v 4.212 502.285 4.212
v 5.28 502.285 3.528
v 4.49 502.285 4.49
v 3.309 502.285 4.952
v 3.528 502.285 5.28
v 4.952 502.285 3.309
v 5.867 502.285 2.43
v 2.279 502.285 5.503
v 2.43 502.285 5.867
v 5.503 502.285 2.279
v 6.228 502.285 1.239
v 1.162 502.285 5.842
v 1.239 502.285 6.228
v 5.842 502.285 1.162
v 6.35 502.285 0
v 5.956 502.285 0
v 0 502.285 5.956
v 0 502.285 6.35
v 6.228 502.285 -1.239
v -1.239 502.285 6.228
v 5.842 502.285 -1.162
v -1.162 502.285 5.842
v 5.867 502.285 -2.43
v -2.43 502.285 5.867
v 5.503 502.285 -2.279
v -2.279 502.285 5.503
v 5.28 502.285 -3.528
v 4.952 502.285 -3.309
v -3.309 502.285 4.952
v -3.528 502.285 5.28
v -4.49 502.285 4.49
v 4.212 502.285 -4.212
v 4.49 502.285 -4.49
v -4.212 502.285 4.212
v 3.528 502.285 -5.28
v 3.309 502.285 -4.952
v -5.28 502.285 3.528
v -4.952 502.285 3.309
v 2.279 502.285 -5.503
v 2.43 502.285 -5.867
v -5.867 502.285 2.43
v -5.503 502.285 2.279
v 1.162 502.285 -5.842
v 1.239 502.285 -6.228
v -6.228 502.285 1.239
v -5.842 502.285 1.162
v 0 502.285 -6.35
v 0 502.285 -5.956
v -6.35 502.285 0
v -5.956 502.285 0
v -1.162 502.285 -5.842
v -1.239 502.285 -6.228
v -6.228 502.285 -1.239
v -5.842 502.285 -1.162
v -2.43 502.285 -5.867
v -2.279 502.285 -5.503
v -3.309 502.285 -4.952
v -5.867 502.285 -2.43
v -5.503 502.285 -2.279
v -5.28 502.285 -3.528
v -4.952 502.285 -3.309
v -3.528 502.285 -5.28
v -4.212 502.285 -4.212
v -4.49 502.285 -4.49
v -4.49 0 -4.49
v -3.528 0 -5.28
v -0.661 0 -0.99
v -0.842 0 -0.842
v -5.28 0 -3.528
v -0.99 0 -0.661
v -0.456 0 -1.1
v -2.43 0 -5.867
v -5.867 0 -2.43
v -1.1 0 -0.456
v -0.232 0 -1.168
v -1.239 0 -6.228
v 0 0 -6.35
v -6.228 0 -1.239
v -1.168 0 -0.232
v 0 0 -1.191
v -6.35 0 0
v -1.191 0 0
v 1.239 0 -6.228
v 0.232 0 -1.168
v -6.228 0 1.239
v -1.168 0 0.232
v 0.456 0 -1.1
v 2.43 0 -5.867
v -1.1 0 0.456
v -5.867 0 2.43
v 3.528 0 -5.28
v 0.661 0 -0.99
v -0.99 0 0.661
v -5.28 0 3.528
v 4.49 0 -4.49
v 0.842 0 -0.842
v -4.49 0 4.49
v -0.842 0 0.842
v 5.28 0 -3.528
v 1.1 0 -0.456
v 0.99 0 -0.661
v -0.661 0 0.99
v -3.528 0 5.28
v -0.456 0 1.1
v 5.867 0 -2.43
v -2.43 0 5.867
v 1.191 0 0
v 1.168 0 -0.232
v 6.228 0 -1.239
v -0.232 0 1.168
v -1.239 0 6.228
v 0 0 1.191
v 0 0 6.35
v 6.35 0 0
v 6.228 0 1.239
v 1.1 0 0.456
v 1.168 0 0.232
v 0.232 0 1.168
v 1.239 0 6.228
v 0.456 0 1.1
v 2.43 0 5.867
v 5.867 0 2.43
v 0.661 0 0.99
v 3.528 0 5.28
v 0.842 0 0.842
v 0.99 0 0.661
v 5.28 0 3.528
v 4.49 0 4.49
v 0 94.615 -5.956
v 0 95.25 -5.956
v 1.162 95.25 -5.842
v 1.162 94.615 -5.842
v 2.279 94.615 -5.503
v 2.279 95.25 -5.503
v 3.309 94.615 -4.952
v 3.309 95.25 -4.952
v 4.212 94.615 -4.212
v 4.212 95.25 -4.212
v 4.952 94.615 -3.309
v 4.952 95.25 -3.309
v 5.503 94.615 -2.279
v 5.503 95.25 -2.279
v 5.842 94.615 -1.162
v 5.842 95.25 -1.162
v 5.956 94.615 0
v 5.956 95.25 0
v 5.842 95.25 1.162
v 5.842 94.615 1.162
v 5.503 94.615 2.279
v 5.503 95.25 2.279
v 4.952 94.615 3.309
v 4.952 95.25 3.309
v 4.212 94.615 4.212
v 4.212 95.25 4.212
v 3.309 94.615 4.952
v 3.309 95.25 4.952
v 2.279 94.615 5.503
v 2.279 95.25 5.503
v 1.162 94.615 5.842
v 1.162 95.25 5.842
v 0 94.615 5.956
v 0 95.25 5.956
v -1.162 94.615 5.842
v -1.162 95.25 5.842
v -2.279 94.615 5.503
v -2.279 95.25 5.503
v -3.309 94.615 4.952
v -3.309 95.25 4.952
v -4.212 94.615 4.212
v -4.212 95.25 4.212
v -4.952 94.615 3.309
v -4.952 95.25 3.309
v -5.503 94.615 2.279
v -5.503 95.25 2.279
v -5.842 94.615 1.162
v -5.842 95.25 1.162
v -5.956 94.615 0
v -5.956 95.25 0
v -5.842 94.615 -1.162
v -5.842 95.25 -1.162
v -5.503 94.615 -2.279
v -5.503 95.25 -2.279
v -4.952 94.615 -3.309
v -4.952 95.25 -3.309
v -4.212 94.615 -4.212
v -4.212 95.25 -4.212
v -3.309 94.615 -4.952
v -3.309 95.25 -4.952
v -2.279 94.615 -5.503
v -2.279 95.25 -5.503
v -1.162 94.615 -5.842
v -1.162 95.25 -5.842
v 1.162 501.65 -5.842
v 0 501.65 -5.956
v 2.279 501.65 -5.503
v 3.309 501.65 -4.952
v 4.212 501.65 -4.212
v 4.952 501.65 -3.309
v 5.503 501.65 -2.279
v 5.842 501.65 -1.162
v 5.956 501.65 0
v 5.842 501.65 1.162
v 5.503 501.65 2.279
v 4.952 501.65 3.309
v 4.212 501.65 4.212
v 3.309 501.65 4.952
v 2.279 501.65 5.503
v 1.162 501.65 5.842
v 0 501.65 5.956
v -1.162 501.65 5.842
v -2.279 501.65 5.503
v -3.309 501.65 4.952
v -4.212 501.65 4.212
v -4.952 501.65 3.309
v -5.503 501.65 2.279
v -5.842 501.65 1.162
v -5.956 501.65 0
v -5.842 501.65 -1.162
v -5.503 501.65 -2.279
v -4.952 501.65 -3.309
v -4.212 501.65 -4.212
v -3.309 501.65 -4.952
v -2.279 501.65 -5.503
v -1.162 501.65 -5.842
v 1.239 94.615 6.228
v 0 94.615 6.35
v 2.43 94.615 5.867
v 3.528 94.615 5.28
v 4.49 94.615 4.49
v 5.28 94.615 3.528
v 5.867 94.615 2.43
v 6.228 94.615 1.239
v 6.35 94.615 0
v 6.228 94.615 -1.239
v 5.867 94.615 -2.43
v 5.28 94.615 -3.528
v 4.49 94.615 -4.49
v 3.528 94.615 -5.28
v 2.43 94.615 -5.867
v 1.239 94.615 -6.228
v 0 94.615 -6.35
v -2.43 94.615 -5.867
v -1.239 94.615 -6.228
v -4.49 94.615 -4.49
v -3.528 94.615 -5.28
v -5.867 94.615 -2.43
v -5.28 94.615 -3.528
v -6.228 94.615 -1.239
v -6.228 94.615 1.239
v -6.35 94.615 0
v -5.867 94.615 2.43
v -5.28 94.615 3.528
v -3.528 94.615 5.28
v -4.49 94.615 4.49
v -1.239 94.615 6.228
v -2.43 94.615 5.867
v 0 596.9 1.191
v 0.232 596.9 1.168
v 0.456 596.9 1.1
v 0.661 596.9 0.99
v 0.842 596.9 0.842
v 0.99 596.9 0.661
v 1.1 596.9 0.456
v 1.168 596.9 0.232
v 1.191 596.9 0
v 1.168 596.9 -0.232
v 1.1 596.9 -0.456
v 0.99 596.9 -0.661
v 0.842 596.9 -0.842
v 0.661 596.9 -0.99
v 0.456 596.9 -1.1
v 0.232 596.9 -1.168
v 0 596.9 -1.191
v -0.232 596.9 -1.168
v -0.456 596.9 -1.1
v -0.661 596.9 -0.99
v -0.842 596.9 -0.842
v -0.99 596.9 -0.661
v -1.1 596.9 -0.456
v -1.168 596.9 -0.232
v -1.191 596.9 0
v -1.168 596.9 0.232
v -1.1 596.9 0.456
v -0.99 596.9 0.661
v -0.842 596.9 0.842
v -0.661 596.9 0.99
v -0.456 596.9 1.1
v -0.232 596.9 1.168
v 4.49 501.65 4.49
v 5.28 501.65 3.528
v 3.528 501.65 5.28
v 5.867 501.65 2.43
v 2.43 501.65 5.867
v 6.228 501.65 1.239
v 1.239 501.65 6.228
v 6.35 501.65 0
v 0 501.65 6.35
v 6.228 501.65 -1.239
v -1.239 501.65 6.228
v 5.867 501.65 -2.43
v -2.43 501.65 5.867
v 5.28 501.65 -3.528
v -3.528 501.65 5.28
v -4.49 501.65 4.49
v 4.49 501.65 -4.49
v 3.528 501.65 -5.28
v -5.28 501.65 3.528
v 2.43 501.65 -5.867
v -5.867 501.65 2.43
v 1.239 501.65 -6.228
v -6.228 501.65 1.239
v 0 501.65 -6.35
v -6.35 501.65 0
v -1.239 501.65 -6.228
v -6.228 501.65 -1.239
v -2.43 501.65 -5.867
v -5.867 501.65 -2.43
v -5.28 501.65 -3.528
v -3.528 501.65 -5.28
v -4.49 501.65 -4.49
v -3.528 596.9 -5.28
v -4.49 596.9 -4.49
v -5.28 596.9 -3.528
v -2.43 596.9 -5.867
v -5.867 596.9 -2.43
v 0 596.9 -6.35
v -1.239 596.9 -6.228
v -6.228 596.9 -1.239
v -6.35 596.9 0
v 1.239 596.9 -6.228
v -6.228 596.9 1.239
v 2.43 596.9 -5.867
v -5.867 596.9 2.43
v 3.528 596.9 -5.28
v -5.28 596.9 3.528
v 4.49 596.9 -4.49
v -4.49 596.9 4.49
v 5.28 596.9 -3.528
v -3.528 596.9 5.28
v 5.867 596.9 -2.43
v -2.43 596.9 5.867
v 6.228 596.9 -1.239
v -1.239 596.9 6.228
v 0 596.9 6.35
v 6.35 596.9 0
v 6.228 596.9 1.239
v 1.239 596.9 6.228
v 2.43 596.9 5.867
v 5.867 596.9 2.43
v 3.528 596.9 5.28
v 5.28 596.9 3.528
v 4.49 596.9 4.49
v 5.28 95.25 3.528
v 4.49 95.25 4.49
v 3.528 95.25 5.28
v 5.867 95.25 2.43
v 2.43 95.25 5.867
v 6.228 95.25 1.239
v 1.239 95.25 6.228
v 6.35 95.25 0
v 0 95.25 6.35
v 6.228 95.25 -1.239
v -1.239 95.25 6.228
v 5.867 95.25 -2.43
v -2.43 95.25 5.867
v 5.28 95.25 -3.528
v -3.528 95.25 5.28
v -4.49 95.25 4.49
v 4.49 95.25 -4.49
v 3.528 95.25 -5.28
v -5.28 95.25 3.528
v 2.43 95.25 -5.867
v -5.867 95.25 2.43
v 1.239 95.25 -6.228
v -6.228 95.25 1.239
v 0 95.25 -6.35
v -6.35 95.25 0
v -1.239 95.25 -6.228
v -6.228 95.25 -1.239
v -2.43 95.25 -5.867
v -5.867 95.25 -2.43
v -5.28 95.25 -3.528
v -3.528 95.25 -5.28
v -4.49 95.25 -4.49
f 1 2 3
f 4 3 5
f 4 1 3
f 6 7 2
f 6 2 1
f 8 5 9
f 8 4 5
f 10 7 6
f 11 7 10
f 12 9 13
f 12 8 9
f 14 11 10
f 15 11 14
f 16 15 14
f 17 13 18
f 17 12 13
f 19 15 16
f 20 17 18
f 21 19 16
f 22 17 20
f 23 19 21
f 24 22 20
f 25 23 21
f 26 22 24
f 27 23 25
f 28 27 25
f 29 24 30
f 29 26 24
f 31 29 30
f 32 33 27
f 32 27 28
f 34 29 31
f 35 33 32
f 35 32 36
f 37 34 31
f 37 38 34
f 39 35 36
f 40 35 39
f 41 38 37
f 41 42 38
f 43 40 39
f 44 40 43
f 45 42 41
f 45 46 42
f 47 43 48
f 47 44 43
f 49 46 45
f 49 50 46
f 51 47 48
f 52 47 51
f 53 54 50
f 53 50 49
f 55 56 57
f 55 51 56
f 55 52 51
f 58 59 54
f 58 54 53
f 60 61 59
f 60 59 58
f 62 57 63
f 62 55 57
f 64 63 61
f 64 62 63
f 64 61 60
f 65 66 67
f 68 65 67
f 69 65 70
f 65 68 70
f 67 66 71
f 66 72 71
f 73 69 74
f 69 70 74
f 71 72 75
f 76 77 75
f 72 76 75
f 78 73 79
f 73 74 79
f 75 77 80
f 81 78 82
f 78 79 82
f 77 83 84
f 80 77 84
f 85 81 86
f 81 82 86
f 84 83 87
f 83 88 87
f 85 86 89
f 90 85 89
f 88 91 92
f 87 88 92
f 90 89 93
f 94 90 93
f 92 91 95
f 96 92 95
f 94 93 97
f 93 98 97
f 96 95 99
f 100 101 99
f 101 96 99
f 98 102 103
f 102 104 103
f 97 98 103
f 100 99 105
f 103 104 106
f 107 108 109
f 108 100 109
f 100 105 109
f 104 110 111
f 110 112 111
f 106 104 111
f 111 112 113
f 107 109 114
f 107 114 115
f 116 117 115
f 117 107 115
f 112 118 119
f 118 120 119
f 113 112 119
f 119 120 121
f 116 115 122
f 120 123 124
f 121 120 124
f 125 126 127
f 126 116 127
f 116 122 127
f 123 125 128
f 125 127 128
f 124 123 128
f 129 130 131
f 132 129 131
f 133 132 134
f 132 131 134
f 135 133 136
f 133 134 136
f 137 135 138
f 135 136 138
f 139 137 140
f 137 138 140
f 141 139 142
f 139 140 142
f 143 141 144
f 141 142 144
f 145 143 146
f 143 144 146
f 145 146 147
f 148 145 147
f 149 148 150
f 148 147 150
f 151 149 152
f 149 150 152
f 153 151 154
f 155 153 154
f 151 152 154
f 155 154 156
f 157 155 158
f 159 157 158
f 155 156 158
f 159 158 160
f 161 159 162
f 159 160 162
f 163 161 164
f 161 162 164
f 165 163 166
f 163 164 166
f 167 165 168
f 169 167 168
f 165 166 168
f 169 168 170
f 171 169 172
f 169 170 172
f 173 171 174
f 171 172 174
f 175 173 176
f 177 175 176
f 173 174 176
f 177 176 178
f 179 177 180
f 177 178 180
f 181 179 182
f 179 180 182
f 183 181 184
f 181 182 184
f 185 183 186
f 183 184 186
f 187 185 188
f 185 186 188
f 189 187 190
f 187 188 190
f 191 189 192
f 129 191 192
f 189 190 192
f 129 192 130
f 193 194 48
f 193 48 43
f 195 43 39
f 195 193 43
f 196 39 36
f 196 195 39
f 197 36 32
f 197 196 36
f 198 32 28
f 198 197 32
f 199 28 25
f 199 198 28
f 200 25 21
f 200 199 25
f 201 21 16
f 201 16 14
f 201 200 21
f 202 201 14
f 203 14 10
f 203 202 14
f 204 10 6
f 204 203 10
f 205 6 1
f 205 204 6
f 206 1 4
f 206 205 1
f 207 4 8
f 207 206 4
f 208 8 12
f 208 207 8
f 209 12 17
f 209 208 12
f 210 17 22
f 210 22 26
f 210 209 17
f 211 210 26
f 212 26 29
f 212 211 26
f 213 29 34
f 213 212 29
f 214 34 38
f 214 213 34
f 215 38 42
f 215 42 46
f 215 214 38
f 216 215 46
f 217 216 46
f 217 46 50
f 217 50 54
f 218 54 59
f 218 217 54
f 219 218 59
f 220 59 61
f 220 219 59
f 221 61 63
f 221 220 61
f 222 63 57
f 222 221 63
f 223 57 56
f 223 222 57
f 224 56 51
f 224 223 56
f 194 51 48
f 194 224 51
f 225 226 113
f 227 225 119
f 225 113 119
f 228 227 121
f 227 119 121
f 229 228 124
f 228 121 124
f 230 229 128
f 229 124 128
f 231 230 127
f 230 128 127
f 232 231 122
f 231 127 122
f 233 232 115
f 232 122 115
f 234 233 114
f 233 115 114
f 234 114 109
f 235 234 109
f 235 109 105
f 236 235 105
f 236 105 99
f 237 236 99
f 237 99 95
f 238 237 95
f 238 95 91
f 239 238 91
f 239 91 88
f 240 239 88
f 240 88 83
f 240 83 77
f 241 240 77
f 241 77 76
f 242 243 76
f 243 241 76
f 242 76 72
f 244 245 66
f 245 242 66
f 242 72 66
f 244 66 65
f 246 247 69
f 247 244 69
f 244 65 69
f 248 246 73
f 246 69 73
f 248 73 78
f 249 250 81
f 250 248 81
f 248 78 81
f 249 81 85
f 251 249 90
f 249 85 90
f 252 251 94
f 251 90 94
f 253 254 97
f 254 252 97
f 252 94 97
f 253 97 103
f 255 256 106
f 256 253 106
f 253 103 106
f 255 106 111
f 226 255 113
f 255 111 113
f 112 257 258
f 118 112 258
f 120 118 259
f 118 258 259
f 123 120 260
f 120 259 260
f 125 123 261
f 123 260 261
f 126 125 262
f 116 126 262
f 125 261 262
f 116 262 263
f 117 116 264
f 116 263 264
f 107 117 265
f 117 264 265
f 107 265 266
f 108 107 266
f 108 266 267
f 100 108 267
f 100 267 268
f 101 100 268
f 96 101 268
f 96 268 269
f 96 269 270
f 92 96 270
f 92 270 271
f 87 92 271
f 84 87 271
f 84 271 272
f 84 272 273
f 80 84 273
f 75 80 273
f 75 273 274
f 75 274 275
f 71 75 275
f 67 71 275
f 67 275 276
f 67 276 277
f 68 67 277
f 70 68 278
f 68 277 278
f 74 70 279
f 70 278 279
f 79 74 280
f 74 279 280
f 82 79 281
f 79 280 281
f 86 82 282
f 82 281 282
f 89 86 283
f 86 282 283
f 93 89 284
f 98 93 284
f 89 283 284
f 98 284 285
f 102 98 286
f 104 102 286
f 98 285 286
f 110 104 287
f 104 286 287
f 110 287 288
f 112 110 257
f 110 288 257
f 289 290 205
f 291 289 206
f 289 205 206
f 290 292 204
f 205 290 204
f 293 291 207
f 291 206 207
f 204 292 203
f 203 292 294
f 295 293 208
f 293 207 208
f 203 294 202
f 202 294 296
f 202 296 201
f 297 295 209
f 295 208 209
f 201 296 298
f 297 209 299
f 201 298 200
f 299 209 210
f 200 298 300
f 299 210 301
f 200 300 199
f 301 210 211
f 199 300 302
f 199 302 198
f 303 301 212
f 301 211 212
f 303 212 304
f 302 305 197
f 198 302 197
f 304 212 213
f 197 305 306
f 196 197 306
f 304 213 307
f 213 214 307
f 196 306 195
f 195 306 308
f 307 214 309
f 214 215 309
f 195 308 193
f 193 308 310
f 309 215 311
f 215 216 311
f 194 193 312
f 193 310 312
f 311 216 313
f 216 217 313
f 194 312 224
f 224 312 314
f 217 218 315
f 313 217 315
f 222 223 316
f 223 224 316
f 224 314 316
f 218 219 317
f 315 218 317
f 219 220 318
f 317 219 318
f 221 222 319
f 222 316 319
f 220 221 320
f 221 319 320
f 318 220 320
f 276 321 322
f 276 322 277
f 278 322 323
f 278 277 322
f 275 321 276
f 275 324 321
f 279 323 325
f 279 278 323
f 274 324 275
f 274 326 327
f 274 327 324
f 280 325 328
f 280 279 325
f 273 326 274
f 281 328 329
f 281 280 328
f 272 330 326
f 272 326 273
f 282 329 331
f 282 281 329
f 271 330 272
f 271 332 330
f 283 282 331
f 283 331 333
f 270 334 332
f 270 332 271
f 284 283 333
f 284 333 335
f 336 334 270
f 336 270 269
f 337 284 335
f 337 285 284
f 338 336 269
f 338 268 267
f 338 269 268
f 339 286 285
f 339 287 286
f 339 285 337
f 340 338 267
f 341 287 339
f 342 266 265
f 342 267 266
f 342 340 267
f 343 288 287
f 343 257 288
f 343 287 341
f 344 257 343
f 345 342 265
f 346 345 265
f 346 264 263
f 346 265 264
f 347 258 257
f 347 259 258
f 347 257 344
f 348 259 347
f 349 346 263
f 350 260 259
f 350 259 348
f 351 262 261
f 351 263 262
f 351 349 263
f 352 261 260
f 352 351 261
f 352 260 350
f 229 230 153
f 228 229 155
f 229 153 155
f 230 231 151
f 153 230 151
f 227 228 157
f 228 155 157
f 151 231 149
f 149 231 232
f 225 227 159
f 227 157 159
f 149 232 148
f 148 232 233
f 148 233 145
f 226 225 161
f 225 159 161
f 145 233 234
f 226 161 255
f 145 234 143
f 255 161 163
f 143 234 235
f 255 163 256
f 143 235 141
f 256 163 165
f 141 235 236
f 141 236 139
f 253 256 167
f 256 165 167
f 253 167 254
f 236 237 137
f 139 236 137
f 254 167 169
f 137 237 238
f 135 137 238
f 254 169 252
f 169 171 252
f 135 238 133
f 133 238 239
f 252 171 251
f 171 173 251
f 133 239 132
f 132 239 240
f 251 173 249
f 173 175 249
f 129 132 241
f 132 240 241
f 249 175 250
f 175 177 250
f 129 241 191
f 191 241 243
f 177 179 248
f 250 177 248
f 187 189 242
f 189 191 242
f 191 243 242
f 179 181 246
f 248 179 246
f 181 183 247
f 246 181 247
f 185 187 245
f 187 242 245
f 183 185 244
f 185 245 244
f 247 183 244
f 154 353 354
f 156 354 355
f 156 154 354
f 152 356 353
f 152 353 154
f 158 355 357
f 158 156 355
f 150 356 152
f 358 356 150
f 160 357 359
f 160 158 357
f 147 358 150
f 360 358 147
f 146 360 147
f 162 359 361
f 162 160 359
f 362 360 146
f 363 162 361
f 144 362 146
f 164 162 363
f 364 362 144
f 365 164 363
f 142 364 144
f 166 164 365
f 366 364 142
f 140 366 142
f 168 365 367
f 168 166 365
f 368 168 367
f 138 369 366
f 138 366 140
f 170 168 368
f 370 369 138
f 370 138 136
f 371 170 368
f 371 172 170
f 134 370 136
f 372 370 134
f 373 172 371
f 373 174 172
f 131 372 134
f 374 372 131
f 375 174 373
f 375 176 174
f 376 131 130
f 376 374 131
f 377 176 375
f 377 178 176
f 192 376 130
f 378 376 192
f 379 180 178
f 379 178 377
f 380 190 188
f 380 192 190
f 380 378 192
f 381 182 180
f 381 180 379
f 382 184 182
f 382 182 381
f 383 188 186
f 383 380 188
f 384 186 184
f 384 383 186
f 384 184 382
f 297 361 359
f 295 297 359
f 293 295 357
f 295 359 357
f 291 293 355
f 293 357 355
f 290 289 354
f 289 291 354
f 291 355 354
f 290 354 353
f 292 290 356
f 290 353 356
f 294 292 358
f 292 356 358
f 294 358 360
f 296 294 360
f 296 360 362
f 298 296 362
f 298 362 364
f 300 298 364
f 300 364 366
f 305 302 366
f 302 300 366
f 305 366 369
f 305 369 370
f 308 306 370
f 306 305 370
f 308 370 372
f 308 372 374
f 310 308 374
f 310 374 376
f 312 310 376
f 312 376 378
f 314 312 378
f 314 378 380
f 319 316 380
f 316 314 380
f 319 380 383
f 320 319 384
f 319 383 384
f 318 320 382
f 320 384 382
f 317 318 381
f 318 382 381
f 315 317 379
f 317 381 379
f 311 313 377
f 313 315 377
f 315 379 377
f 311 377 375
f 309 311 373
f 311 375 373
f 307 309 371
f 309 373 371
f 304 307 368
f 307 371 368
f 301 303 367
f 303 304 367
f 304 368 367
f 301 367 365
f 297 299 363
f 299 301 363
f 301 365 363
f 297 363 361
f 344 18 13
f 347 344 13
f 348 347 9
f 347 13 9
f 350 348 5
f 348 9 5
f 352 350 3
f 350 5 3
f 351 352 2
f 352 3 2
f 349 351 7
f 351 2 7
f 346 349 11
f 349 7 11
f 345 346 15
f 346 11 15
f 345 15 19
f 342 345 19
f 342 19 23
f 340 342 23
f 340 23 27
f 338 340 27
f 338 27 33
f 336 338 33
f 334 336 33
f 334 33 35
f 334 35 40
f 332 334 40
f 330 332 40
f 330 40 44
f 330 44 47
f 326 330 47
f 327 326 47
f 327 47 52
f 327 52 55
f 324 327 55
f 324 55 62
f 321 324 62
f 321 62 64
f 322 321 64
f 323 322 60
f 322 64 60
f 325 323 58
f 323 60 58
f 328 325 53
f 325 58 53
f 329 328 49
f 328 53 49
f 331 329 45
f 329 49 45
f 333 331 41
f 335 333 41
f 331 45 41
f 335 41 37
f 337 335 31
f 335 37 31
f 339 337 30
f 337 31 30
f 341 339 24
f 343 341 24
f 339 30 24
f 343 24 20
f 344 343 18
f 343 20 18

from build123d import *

# Parameters (mm, degrees)
SKETCH1_R           = 6.35
BOSS_EXTRUDE1_DEPTH = 596.9
SKETCH2_R           = 1.190625
CUT_EXTRUDE1_DEPTH  = 609.6
SKETCH6_OUTSIDE_W   = 134.134
SKETCH6_OUTSIDE_H   = 134.134
SKETCH6_OUTSIDE_R   = 5.9563
CUT_EXTRUDE2_DEPTH  = 0.635


with BuildPart() as part:
    # Sketch1 → Boss-Extrude1 (new body)
    with BuildSketch(Plane(origin=(0, 0, 0), x_dir=(1, 0, 0), z_dir=(0, 1, 0))):
        with Locations(Location((0, 0, 0), (0, 0, 270))):
            Circle(SKETCH1_R)
    extrude(amount=BOSS_EXTRUDE1_DEPTH)

    # Sketch2 → Cut-Extrude1 (cut)
    with BuildSketch(Plane(origin=(0, 596.9, 0), x_dir=(1, 0, 0), z_dir=(0, 1, 0))):
        with Locations(Location((0, 0, 0), (0, 0, 270))):
            Circle(SKETCH2_R)
    extrude(amount=-CUT_EXTRUDE1_DEPTH, mode=Mode.SUBTRACT)

    # Sketch6 outside → Cut-Extrude2 (cut)
    with BuildSketch(Plane(origin=(0, 95.25, 0), x_dir=(-1, 0, 0), z_dir=(0, -1, 0))):
        Rectangle(SKETCH6_OUTSIDE_W, SKETCH6_OUTSIDE_H)
        with Locations(Location((0, 0, 0), (0, 0, 90))):
            Circle(SKETCH6_OUTSIDE_R, mode=Mode.SUBTRACT)
    cut_extrude2 = extrude(amount=CUT_EXTRUDE2_DEPTH, mode=Mode.SUBTRACT)

    # Mirror1: Cut-Extrude2 across plane
    add(cut_extrude2.mirror(Plane(origin=(0, 298.45, 0), x_dir=(0, 0, 1), z_dir=(0, -1, 0))), mode=Mode.SUBTRACT)


solid = part.part
